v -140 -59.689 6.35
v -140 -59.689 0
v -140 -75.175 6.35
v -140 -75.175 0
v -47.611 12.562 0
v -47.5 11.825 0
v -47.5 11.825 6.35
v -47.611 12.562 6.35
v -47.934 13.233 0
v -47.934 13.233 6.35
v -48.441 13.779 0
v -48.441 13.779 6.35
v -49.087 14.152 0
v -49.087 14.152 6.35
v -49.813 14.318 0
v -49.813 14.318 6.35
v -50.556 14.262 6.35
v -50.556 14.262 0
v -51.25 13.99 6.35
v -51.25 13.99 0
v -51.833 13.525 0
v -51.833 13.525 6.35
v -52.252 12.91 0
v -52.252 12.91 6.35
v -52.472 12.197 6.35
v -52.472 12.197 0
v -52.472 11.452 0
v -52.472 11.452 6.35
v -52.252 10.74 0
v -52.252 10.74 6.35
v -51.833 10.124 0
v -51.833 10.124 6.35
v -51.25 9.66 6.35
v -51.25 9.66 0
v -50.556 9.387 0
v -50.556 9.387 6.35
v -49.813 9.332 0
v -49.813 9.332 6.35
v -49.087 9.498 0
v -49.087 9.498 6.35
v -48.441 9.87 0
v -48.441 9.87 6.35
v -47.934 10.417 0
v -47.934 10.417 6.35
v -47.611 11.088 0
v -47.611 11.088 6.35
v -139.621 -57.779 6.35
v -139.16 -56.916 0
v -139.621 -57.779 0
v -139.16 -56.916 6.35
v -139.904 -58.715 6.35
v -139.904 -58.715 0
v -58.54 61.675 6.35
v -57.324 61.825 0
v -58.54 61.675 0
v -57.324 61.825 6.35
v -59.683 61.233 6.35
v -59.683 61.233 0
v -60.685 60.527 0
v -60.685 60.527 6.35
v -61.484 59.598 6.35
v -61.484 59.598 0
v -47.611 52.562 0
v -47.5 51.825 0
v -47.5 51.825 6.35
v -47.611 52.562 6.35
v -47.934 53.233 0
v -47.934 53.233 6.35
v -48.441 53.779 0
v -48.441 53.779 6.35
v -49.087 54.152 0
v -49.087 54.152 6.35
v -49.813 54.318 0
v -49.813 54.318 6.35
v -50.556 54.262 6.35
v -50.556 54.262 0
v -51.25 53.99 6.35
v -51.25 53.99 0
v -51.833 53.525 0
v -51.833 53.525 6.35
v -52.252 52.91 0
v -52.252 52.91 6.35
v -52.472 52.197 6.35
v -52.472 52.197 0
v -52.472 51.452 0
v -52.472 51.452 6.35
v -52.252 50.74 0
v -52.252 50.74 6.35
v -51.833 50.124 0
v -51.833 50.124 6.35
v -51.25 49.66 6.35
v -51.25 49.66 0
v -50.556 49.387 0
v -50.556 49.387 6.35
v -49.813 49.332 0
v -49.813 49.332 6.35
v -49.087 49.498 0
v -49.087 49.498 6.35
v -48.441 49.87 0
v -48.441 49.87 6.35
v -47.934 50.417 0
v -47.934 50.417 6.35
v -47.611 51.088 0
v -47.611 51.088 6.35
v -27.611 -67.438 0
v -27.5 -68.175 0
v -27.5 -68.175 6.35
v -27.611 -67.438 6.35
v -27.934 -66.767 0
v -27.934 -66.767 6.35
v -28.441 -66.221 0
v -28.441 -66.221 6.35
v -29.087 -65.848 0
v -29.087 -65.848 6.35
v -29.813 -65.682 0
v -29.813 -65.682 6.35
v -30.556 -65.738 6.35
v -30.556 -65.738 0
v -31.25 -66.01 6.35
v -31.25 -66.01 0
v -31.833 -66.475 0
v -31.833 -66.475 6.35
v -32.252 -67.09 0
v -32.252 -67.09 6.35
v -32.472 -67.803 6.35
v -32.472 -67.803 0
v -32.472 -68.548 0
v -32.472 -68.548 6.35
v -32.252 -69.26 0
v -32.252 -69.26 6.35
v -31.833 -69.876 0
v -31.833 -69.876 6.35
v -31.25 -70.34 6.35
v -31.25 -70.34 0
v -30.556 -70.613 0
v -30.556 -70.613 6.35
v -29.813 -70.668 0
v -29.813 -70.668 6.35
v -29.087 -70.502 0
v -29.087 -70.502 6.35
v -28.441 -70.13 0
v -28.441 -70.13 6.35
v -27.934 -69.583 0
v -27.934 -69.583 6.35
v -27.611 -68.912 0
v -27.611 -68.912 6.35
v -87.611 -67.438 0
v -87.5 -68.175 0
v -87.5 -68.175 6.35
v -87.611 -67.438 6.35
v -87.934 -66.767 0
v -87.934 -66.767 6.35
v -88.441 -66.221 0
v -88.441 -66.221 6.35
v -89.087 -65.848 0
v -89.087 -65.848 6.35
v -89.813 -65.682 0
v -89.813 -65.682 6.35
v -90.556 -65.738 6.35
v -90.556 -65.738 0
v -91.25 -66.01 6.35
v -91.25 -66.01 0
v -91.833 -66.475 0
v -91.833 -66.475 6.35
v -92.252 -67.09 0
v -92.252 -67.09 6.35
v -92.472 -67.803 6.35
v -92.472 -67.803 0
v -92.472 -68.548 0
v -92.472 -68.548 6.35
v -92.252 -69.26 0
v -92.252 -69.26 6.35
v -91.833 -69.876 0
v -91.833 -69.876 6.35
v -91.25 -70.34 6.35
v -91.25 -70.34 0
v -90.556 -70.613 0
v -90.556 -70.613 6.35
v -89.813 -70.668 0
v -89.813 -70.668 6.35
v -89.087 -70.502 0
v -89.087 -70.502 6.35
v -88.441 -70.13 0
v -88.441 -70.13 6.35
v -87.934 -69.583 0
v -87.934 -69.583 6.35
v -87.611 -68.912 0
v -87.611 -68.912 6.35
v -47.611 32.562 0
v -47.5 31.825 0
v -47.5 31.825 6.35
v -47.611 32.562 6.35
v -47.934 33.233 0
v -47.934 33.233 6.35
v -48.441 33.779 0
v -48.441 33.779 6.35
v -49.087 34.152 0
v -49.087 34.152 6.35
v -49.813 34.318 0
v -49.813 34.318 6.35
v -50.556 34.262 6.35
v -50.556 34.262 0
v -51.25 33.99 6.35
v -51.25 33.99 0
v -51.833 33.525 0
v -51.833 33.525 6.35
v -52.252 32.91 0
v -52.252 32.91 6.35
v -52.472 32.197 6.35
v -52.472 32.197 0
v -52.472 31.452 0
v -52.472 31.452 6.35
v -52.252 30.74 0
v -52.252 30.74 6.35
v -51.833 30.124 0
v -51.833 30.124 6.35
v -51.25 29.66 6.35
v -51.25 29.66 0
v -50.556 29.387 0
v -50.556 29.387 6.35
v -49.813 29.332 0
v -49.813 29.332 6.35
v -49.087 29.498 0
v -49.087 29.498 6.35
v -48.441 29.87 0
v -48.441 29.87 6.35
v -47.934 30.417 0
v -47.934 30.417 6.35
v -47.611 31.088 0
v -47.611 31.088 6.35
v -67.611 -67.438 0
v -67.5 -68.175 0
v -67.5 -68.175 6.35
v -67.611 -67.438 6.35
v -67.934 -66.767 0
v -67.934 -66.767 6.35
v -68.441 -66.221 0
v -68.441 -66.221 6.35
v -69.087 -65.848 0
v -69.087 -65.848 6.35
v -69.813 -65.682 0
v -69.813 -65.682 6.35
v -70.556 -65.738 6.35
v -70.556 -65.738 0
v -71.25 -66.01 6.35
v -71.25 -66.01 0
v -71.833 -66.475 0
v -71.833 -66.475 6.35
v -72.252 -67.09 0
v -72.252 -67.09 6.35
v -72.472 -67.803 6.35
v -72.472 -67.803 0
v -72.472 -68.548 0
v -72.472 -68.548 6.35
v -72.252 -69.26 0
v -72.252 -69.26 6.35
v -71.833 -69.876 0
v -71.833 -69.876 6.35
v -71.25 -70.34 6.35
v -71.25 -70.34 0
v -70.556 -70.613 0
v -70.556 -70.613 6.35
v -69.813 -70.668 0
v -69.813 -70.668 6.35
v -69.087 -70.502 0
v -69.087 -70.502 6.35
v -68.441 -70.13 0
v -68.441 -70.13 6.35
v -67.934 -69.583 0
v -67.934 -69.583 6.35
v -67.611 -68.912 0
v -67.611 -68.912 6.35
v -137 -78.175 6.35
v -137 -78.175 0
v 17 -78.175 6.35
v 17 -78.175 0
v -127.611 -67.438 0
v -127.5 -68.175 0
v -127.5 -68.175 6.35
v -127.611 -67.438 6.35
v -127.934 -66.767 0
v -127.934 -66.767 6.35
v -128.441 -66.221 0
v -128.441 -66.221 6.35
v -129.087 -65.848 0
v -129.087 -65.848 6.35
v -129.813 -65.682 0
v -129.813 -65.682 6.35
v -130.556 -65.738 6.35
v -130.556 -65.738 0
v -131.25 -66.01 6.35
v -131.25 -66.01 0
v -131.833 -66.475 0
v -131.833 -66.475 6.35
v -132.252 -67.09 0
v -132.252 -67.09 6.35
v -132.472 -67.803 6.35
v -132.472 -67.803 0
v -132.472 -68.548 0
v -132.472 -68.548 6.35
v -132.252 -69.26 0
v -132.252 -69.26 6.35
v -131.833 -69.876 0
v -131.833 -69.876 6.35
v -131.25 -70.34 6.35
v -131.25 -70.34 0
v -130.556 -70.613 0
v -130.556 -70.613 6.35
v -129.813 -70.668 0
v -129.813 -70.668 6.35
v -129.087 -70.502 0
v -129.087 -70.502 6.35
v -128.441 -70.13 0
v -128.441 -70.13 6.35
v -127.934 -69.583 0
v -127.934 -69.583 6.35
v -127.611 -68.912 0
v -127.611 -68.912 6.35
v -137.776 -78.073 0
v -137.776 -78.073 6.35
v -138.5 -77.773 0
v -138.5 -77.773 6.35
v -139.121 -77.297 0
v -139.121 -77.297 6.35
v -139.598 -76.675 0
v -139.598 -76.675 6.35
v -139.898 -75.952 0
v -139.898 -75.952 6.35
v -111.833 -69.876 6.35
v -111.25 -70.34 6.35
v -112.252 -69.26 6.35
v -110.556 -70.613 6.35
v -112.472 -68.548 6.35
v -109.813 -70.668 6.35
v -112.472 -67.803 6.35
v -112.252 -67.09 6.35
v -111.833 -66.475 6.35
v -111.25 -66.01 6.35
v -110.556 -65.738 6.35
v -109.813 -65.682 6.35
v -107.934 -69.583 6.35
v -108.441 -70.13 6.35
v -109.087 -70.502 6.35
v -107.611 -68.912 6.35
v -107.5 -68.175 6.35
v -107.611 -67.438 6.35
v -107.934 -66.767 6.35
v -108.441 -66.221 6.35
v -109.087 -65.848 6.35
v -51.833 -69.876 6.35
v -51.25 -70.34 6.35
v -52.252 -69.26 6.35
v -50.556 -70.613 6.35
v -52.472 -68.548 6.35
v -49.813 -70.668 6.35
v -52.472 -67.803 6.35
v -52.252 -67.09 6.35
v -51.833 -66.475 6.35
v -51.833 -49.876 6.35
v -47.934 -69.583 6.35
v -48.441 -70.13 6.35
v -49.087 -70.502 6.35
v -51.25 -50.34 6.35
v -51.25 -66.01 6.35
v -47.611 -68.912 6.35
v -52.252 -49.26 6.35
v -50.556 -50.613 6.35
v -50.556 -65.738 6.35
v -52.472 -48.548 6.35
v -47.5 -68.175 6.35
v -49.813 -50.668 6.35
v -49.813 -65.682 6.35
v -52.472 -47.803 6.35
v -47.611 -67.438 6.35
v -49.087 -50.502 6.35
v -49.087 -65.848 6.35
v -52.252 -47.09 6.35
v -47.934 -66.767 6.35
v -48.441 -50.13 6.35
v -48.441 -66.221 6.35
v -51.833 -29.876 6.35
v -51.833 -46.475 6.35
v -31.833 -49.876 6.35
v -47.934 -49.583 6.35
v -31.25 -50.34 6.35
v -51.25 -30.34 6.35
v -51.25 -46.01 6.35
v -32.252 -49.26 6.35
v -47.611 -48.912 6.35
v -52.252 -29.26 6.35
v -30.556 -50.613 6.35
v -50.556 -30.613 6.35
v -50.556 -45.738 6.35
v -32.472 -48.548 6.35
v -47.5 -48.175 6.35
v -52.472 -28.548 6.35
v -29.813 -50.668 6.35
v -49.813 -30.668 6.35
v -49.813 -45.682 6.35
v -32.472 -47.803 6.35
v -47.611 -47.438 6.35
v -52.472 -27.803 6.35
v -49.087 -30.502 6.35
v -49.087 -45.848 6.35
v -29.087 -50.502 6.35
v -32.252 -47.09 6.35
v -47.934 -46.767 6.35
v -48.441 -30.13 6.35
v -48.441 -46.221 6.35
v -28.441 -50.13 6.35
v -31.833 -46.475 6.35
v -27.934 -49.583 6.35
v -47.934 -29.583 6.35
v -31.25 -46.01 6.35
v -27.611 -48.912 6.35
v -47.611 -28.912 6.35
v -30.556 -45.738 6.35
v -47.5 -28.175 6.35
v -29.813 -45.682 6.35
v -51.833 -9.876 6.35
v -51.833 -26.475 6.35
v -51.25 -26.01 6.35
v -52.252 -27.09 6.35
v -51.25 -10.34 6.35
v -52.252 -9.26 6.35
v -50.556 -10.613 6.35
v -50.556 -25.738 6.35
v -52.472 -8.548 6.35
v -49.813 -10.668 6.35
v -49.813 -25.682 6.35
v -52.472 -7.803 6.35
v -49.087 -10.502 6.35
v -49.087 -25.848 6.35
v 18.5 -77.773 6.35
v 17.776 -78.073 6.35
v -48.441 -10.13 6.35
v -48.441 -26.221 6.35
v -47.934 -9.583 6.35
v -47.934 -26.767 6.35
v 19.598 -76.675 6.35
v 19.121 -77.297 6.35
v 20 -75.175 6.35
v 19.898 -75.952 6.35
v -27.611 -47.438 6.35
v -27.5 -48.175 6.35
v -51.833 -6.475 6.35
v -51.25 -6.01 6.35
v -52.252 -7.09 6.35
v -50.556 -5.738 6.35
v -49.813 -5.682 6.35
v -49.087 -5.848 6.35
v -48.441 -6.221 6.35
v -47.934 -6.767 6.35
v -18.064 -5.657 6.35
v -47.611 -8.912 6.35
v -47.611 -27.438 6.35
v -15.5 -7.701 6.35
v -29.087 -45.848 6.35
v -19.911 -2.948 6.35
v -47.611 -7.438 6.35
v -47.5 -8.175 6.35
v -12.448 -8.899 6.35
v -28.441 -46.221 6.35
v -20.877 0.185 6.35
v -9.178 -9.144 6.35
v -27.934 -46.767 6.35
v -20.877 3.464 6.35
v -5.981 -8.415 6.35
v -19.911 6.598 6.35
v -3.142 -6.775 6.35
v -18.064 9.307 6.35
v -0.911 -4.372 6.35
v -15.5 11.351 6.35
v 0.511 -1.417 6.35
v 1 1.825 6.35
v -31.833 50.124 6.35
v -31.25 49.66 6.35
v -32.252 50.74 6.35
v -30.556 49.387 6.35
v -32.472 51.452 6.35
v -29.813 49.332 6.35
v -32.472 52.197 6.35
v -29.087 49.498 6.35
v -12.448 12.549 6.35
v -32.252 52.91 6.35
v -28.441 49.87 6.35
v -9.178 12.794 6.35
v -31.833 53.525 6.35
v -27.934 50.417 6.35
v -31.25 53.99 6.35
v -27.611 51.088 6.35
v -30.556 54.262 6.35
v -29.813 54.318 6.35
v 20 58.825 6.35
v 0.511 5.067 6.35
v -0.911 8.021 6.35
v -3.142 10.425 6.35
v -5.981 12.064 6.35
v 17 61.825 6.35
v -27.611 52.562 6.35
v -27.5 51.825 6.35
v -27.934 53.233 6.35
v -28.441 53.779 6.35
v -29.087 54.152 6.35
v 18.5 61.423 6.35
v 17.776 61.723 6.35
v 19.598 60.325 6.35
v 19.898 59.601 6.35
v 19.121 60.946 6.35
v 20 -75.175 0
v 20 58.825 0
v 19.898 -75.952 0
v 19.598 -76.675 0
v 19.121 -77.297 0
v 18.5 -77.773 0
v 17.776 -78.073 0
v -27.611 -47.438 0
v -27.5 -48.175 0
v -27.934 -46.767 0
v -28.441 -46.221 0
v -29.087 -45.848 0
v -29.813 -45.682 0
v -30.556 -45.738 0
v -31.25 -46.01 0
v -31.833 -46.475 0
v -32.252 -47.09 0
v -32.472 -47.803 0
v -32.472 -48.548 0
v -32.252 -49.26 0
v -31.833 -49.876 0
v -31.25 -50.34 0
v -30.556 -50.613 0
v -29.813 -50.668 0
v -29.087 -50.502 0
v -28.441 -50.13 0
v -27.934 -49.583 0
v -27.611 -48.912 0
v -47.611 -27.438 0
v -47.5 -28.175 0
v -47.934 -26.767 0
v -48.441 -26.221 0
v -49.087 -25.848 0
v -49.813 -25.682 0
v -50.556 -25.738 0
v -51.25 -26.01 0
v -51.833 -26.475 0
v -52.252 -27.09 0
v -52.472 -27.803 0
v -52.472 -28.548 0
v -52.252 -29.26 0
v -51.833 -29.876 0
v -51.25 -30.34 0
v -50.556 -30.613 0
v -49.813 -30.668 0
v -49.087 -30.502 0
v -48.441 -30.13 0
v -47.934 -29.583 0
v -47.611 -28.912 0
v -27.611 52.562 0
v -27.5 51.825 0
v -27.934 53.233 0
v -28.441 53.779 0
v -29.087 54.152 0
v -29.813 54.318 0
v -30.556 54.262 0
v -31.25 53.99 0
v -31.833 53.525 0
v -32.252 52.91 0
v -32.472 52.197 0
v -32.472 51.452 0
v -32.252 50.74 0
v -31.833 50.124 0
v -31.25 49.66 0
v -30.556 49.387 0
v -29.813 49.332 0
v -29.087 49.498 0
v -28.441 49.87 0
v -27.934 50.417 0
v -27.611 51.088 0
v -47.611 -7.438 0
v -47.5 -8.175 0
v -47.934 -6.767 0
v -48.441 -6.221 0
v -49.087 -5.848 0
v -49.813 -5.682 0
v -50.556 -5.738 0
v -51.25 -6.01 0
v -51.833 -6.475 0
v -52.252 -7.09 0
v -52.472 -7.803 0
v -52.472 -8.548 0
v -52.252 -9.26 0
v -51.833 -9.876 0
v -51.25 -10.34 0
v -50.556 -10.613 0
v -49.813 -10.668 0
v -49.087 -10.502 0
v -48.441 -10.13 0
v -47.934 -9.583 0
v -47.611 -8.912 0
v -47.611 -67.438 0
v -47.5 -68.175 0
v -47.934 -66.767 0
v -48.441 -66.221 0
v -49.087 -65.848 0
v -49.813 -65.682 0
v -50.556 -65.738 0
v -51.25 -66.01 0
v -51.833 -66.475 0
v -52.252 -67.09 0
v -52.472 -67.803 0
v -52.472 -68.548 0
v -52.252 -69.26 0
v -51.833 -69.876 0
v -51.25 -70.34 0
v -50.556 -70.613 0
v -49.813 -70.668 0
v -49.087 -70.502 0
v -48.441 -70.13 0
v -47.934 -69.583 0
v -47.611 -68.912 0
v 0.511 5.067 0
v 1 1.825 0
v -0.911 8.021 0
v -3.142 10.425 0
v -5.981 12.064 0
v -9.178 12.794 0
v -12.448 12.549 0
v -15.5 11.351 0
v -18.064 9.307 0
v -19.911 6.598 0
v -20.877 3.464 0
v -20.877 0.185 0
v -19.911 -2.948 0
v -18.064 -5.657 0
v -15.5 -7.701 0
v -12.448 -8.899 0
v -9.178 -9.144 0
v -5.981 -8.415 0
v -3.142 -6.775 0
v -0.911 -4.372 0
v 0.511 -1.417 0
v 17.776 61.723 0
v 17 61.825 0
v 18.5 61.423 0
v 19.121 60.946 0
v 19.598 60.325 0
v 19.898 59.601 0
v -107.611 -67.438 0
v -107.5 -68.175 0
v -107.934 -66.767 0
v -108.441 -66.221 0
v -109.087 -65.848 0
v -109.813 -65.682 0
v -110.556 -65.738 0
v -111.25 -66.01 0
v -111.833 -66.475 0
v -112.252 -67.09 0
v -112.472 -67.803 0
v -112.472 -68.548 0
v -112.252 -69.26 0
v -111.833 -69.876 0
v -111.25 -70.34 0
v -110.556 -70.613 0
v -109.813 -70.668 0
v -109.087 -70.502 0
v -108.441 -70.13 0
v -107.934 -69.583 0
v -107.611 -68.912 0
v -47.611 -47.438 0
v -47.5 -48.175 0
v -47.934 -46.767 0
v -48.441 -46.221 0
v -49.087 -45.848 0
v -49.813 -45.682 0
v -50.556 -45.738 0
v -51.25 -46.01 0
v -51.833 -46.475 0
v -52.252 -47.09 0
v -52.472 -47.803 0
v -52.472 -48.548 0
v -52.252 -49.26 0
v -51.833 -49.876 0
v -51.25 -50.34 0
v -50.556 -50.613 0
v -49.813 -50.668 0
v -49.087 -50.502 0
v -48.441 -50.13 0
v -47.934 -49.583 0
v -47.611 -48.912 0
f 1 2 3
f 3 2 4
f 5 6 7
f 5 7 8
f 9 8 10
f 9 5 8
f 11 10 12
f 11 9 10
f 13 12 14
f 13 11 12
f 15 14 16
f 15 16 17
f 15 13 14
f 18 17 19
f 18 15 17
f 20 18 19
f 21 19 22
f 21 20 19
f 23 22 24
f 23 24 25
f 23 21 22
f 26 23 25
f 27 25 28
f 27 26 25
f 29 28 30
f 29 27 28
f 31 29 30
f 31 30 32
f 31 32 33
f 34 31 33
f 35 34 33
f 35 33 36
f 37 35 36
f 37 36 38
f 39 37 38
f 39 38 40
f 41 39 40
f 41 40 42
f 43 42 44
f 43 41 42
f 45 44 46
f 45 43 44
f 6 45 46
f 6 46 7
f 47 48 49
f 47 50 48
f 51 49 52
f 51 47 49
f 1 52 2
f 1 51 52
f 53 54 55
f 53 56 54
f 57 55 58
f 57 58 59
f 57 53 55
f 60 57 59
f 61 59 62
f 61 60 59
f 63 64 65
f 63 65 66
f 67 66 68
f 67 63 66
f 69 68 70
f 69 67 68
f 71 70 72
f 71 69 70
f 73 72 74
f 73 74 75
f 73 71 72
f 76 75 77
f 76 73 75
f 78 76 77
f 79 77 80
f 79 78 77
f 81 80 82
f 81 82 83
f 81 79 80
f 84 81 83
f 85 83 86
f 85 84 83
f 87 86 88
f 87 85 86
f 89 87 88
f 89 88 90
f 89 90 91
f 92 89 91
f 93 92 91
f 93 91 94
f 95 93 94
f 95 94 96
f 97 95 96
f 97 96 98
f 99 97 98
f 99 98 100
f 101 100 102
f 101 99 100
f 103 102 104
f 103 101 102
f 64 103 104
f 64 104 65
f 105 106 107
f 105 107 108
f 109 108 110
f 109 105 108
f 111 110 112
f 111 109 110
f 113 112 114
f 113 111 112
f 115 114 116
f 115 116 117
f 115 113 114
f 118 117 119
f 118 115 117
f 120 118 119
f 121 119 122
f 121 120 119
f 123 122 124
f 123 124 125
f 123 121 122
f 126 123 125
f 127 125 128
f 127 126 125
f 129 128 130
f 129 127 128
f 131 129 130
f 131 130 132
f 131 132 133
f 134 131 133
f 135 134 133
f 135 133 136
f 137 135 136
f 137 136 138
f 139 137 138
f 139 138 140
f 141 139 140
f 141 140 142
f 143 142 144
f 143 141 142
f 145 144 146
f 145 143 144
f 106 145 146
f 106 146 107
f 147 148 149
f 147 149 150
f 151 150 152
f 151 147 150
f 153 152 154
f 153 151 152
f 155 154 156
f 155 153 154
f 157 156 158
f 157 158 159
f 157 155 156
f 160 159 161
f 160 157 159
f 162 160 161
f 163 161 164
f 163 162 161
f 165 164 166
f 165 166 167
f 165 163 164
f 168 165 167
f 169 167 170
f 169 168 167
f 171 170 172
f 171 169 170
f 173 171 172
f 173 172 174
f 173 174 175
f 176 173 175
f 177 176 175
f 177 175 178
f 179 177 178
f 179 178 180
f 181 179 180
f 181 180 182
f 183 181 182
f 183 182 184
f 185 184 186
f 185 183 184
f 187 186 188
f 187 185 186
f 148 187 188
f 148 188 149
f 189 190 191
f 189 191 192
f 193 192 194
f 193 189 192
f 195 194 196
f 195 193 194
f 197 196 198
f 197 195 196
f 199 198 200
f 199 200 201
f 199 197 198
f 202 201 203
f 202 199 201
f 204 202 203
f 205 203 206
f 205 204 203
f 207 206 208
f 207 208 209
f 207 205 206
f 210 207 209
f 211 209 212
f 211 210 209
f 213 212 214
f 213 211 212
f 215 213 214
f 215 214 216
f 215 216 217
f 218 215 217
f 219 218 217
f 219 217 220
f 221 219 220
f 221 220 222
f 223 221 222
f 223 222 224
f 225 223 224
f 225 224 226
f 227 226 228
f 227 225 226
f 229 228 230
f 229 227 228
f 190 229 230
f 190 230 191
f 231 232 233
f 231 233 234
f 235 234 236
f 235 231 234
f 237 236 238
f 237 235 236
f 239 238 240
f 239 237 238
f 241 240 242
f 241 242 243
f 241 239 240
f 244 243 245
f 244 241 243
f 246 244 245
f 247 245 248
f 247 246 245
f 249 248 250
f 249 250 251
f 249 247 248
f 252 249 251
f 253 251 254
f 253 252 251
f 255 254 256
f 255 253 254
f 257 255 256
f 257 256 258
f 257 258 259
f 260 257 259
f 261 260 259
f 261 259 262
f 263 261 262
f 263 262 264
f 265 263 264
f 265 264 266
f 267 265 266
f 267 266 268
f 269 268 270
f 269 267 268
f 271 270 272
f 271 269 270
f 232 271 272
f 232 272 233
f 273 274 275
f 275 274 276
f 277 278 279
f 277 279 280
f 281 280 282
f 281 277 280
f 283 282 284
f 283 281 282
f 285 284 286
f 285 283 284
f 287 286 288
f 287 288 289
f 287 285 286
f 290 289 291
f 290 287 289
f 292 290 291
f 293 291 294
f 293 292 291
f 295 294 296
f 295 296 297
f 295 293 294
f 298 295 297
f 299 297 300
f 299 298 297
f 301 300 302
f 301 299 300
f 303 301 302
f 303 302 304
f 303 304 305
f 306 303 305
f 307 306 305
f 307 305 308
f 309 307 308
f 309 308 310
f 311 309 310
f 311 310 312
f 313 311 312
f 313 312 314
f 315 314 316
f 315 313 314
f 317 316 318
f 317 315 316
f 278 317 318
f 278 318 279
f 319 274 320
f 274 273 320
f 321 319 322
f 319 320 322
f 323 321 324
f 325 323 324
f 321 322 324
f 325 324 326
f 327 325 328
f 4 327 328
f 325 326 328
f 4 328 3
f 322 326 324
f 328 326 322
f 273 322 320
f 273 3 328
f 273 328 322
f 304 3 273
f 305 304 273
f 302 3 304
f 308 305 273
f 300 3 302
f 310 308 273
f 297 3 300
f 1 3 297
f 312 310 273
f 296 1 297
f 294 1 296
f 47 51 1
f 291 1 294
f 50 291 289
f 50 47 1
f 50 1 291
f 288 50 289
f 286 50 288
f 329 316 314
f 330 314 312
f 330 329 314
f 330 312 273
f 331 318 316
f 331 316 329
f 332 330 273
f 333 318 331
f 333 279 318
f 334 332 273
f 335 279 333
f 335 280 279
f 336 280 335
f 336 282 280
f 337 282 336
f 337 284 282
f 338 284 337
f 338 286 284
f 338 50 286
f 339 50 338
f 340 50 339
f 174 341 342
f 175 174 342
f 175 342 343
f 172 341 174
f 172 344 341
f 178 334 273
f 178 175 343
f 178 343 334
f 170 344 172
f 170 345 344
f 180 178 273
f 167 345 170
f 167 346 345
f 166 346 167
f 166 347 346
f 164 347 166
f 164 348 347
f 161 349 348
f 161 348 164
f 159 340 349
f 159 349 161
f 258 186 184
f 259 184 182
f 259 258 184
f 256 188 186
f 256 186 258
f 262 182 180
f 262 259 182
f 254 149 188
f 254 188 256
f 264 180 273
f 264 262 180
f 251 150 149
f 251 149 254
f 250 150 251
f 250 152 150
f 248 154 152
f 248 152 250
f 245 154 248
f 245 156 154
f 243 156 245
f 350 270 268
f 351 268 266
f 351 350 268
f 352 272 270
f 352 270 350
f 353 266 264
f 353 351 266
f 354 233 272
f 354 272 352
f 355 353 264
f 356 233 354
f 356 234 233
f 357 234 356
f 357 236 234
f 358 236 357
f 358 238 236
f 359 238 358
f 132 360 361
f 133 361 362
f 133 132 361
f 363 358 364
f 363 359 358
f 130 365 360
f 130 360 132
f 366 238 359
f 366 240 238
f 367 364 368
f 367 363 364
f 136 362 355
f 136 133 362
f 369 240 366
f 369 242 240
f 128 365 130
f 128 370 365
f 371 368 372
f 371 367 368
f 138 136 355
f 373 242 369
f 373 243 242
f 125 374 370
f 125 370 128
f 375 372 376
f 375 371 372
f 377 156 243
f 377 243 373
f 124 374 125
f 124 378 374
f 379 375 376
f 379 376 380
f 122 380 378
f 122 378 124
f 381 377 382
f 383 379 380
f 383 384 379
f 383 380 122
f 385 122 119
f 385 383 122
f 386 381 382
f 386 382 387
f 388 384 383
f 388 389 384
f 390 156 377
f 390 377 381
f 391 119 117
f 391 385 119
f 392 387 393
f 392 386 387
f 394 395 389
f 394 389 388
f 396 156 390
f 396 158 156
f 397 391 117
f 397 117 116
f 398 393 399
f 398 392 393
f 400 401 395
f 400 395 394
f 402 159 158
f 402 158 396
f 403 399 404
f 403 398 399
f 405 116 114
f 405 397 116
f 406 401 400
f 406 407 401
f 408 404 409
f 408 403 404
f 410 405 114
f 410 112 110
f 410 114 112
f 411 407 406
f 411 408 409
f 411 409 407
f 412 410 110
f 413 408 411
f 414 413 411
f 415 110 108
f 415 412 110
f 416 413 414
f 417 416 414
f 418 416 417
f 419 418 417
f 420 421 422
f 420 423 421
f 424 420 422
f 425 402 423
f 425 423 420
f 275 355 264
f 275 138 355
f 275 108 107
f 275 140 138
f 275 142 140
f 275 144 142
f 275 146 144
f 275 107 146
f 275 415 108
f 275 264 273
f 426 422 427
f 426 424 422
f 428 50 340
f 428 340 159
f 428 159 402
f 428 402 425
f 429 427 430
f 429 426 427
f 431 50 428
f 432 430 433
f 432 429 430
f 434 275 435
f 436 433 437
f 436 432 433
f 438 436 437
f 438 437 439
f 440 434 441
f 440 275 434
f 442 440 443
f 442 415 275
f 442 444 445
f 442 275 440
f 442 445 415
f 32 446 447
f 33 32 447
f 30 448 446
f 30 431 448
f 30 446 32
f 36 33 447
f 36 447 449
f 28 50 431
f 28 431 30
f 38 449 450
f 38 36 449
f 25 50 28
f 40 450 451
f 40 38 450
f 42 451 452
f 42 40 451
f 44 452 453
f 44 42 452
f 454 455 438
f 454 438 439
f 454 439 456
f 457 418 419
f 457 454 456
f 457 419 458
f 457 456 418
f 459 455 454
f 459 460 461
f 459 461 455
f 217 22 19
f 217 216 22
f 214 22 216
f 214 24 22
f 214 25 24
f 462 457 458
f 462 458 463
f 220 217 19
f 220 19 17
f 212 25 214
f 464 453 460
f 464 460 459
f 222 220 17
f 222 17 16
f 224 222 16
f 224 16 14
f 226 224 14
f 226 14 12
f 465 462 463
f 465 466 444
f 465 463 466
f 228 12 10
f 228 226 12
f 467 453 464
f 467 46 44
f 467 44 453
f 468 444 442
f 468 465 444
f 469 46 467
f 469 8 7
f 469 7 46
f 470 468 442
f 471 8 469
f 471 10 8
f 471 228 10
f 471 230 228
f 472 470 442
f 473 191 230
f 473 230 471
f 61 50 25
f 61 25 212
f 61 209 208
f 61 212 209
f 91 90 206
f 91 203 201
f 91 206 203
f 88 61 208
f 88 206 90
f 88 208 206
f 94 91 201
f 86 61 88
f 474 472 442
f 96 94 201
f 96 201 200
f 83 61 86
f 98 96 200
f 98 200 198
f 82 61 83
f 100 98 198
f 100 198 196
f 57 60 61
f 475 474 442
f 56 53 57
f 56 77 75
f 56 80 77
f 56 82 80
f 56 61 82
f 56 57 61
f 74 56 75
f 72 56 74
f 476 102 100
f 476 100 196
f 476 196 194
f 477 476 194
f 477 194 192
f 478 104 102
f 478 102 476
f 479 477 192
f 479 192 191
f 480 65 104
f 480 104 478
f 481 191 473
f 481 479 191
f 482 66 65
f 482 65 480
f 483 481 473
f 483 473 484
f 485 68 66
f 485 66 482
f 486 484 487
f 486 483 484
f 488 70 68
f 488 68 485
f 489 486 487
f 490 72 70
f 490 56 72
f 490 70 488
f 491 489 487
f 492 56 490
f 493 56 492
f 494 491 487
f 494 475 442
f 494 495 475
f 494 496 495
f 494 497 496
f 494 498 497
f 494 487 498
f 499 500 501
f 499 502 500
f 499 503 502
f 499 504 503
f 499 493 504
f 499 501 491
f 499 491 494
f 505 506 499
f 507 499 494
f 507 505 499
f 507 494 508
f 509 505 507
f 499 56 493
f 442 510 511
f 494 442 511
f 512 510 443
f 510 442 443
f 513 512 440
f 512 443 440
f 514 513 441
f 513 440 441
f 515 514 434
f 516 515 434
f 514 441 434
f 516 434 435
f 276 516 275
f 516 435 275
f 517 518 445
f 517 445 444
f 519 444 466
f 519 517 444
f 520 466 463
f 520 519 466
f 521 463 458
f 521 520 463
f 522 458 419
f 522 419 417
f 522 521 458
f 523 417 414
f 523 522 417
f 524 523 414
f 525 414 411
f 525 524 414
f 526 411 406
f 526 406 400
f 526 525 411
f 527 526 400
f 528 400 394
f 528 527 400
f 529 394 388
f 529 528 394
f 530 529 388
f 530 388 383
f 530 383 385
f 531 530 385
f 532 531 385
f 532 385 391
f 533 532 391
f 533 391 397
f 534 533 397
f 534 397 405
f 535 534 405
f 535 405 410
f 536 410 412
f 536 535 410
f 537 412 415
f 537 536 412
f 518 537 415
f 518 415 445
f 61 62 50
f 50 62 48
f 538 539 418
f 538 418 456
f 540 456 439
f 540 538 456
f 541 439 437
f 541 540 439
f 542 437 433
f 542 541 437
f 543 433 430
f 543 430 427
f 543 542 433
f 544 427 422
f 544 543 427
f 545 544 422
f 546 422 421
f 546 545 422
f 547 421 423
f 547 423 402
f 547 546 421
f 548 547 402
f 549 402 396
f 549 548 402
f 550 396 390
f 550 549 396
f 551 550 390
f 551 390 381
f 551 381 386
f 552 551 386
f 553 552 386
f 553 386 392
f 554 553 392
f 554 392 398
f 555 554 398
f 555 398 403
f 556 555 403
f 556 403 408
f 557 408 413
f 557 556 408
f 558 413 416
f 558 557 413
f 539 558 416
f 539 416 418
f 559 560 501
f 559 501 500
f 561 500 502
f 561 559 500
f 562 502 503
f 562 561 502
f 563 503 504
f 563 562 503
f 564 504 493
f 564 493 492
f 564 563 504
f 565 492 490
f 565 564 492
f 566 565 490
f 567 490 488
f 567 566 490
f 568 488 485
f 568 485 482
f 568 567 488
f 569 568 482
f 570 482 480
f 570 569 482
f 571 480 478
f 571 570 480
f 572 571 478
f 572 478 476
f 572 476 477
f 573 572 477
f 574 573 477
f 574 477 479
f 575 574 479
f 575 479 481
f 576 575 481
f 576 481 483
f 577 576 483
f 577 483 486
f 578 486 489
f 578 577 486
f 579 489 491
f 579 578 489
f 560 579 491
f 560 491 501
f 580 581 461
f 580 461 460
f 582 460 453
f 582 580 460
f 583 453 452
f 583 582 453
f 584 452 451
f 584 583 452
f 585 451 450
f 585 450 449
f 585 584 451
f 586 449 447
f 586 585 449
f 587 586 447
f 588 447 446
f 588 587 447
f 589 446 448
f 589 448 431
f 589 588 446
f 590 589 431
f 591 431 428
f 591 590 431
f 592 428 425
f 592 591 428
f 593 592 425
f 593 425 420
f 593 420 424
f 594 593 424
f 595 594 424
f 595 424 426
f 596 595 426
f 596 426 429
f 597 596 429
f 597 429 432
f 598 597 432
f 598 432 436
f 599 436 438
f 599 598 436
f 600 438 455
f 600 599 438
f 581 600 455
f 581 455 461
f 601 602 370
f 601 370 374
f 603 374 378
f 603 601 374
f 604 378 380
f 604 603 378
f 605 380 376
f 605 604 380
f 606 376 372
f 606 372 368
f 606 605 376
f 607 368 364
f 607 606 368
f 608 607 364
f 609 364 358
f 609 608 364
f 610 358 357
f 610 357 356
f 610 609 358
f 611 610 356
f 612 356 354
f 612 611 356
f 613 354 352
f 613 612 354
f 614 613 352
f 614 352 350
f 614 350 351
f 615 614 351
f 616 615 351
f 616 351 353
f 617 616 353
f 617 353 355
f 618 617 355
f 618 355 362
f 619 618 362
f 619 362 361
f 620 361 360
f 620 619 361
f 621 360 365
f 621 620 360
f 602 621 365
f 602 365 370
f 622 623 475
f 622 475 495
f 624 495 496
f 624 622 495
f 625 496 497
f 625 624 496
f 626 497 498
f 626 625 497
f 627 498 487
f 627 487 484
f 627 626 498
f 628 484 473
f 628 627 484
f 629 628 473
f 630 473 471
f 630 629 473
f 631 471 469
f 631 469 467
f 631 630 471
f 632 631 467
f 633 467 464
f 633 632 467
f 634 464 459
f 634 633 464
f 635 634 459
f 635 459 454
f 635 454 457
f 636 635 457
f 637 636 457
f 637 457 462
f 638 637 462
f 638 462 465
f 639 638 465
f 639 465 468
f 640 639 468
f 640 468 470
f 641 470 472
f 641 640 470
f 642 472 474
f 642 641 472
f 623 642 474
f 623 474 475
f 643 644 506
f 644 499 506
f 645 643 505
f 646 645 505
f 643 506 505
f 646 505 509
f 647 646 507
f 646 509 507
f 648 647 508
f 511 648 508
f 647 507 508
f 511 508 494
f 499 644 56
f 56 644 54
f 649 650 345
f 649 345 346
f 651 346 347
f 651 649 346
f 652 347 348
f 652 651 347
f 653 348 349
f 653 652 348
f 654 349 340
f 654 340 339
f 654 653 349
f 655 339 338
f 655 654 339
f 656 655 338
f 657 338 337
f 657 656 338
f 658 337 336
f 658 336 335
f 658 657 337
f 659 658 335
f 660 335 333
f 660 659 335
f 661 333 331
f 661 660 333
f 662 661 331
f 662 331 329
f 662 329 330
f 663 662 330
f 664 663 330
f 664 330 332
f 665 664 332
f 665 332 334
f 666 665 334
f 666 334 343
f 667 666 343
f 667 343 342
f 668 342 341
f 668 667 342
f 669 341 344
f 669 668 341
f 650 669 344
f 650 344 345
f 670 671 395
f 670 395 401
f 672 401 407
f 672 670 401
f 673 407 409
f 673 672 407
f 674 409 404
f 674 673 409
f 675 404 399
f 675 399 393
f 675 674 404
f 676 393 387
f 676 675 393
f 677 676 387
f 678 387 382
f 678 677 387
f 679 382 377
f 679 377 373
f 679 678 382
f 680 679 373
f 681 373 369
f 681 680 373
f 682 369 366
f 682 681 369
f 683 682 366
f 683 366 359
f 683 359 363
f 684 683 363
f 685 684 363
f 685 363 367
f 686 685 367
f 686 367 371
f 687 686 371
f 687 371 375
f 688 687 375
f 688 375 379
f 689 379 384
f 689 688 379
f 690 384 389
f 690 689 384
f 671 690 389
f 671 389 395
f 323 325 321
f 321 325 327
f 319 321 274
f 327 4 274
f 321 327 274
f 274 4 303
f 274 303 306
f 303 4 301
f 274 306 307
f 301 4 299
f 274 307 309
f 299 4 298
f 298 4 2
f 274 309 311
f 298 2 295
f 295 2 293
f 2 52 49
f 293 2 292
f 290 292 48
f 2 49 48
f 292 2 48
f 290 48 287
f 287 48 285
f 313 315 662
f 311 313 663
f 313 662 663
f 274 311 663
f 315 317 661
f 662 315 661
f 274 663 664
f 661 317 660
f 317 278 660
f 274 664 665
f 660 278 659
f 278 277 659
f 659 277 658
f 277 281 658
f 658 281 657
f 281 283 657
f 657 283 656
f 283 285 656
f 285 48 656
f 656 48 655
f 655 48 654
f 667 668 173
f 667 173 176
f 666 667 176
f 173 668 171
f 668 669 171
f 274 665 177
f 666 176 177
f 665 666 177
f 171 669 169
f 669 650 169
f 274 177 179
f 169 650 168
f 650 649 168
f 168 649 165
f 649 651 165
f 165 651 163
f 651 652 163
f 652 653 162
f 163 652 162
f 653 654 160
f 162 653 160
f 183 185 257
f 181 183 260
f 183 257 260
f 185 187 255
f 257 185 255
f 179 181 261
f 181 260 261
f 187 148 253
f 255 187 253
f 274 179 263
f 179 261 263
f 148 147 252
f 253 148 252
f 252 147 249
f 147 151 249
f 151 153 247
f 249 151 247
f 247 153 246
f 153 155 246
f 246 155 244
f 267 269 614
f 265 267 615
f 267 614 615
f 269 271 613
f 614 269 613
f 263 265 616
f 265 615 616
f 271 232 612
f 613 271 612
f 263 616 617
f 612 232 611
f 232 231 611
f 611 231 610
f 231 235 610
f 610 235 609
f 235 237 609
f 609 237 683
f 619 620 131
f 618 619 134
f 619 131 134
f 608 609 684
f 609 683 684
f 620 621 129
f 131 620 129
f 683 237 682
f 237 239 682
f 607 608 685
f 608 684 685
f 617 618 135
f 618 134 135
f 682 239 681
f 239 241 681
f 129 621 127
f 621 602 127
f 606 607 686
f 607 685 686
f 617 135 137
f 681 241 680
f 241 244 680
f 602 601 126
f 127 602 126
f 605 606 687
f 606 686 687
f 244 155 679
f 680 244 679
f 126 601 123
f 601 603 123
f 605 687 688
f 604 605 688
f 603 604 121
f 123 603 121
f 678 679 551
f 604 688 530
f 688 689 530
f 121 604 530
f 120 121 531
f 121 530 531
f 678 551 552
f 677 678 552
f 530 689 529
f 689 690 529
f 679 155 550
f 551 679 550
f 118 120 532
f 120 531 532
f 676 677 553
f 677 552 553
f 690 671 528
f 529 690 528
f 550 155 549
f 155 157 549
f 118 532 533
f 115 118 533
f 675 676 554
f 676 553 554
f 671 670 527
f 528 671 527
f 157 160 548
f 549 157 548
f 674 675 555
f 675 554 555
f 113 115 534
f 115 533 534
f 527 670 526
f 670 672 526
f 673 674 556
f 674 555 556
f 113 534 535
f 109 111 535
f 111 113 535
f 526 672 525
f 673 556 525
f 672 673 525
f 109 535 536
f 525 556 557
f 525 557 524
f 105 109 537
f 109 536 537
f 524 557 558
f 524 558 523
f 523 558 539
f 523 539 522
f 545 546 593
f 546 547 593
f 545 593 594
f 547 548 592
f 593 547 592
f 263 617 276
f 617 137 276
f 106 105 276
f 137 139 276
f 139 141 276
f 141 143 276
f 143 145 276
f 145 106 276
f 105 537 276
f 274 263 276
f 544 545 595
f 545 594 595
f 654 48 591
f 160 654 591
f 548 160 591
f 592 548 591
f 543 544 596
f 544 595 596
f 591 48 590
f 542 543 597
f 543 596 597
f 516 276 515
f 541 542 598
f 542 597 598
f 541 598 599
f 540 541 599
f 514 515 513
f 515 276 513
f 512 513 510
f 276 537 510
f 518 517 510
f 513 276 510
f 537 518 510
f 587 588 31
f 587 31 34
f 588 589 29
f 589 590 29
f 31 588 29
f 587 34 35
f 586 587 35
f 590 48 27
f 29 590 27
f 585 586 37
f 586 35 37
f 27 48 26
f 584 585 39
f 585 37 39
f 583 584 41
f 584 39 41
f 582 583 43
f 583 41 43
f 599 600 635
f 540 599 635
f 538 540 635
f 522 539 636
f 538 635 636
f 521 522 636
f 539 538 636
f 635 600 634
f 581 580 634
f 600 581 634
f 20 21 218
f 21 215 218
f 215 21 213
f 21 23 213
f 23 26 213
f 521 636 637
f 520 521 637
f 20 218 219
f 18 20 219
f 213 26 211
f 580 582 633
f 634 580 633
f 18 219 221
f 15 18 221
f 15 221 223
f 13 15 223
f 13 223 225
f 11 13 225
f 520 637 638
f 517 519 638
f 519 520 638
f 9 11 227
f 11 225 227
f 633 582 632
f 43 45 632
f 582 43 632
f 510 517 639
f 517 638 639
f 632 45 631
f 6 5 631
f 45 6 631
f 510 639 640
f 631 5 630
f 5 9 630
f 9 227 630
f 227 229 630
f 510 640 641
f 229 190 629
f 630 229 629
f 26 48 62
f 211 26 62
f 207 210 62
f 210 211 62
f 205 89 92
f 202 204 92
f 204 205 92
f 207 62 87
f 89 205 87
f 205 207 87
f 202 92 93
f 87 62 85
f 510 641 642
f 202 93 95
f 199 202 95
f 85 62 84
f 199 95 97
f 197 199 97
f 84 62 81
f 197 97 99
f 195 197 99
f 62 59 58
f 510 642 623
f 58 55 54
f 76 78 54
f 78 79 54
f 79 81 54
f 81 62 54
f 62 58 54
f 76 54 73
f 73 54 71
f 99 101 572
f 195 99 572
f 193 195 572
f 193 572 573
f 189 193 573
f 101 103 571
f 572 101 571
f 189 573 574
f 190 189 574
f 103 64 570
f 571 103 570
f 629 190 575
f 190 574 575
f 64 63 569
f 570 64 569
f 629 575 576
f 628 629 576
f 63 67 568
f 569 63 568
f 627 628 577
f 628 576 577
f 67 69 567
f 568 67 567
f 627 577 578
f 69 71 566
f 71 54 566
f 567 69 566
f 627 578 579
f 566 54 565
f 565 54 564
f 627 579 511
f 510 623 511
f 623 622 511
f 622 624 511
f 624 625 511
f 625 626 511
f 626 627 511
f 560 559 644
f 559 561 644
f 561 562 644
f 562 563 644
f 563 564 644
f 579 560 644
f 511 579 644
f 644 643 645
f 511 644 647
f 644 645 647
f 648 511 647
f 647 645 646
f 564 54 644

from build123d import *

# Parameters (mm, degrees)
SKETCH1_R           = 2.5
SKETCH1_R_2         = 11
BOSS_EXTRUDE1_DEPTH = 6.35
FILLET1_R           = 5
FILLET2_R           = 3


with BuildPart() as part:
    # Sketch1 → Boss-Extrude1 (new body)
    with BuildSketch(Plane.XY):
        Polygon((20, 61.824817518), (-60, 61.824817518), (-140, -58.175182482), (-140, -78.175182482), (20, -78.175182482), align=None)
        with Locations((-50, -48.175182482)):
            Circle(SKETCH1_R, mode=Mode.SUBTRACT)
        with Locations((-50, -28.175182482)):
            Circle(SKETCH1_R, mode=Mode.SUBTRACT)
        with Locations((-50, -8.175182482)):
            Circle(SKETCH1_R, mode=Mode.SUBTRACT)
        with Locations((-50, 11.824817518)):
            Circle(SKETCH1_R, mode=Mode.SUBTRACT)
        with Locations((-50, 31.824817518)):
            Circle(SKETCH1_R, mode=Mode.SUBTRACT)
        with Locations((-50, 51.824817518)):
            Circle(SKETCH1_R, mode=Mode.SUBTRACT)
        with Locations((-30, -48.175182482)):
            Circle(SKETCH1_R, mode=Mode.SUBTRACT)
        with Locations((-30, 51.824817518)):
            Circle(SKETCH1_R, mode=Mode.SUBTRACT)
        with Locations((-10, 1.824817518)):
            Circle(SKETCH1_R_2, mode=Mode.SUBTRACT)
        with Locations((-30, -68.175182482)):
            Circle(SKETCH1_R, mode=Mode.SUBTRACT)
        with Locations((-50, -68.175182482)):
            Circle(SKETCH1_R, mode=Mode.SUBTRACT)
        with Locations((-70, -68.175182482)):
            Circle(SKETCH1_R, mode=Mode.SUBTRACT)
        with Locations((-90, -68.175182482)):
            Circle(SKETCH1_R, mode=Mode.SUBTRACT)
        with Locations((-110, -68.175182482)):
            Circle(SKETCH1_R, mode=Mode.SUBTRACT)
        with Locations((-130, -68.175182482)):
            Circle(SKETCH1_R, mode=Mode.SUBTRACT)
    extrude(amount=BOSS_EXTRUDE1_DEPTH)

    # Fillet1
    fillet1_edges = [part.edges().sort_by_distance(p)[0] for p in [
        (-140, -58.175182482, 3.175),
        (-60, 61.824817518, 3.175),
    ]]
    fillet(fillet1_edges, radius=FILLET1_R)

    # Fillet2
    fillet2_edges = [part.edges().sort_by_distance(p)[0] for p in [
        (20, -78.175182482, 3.175),
        (-140, -78.175182482, 3.175),
        (20, 61.824817518, 3.175),
    ]]
    fillet(fillet2_edges, radius=FILLET2_R)


solid = part.part
